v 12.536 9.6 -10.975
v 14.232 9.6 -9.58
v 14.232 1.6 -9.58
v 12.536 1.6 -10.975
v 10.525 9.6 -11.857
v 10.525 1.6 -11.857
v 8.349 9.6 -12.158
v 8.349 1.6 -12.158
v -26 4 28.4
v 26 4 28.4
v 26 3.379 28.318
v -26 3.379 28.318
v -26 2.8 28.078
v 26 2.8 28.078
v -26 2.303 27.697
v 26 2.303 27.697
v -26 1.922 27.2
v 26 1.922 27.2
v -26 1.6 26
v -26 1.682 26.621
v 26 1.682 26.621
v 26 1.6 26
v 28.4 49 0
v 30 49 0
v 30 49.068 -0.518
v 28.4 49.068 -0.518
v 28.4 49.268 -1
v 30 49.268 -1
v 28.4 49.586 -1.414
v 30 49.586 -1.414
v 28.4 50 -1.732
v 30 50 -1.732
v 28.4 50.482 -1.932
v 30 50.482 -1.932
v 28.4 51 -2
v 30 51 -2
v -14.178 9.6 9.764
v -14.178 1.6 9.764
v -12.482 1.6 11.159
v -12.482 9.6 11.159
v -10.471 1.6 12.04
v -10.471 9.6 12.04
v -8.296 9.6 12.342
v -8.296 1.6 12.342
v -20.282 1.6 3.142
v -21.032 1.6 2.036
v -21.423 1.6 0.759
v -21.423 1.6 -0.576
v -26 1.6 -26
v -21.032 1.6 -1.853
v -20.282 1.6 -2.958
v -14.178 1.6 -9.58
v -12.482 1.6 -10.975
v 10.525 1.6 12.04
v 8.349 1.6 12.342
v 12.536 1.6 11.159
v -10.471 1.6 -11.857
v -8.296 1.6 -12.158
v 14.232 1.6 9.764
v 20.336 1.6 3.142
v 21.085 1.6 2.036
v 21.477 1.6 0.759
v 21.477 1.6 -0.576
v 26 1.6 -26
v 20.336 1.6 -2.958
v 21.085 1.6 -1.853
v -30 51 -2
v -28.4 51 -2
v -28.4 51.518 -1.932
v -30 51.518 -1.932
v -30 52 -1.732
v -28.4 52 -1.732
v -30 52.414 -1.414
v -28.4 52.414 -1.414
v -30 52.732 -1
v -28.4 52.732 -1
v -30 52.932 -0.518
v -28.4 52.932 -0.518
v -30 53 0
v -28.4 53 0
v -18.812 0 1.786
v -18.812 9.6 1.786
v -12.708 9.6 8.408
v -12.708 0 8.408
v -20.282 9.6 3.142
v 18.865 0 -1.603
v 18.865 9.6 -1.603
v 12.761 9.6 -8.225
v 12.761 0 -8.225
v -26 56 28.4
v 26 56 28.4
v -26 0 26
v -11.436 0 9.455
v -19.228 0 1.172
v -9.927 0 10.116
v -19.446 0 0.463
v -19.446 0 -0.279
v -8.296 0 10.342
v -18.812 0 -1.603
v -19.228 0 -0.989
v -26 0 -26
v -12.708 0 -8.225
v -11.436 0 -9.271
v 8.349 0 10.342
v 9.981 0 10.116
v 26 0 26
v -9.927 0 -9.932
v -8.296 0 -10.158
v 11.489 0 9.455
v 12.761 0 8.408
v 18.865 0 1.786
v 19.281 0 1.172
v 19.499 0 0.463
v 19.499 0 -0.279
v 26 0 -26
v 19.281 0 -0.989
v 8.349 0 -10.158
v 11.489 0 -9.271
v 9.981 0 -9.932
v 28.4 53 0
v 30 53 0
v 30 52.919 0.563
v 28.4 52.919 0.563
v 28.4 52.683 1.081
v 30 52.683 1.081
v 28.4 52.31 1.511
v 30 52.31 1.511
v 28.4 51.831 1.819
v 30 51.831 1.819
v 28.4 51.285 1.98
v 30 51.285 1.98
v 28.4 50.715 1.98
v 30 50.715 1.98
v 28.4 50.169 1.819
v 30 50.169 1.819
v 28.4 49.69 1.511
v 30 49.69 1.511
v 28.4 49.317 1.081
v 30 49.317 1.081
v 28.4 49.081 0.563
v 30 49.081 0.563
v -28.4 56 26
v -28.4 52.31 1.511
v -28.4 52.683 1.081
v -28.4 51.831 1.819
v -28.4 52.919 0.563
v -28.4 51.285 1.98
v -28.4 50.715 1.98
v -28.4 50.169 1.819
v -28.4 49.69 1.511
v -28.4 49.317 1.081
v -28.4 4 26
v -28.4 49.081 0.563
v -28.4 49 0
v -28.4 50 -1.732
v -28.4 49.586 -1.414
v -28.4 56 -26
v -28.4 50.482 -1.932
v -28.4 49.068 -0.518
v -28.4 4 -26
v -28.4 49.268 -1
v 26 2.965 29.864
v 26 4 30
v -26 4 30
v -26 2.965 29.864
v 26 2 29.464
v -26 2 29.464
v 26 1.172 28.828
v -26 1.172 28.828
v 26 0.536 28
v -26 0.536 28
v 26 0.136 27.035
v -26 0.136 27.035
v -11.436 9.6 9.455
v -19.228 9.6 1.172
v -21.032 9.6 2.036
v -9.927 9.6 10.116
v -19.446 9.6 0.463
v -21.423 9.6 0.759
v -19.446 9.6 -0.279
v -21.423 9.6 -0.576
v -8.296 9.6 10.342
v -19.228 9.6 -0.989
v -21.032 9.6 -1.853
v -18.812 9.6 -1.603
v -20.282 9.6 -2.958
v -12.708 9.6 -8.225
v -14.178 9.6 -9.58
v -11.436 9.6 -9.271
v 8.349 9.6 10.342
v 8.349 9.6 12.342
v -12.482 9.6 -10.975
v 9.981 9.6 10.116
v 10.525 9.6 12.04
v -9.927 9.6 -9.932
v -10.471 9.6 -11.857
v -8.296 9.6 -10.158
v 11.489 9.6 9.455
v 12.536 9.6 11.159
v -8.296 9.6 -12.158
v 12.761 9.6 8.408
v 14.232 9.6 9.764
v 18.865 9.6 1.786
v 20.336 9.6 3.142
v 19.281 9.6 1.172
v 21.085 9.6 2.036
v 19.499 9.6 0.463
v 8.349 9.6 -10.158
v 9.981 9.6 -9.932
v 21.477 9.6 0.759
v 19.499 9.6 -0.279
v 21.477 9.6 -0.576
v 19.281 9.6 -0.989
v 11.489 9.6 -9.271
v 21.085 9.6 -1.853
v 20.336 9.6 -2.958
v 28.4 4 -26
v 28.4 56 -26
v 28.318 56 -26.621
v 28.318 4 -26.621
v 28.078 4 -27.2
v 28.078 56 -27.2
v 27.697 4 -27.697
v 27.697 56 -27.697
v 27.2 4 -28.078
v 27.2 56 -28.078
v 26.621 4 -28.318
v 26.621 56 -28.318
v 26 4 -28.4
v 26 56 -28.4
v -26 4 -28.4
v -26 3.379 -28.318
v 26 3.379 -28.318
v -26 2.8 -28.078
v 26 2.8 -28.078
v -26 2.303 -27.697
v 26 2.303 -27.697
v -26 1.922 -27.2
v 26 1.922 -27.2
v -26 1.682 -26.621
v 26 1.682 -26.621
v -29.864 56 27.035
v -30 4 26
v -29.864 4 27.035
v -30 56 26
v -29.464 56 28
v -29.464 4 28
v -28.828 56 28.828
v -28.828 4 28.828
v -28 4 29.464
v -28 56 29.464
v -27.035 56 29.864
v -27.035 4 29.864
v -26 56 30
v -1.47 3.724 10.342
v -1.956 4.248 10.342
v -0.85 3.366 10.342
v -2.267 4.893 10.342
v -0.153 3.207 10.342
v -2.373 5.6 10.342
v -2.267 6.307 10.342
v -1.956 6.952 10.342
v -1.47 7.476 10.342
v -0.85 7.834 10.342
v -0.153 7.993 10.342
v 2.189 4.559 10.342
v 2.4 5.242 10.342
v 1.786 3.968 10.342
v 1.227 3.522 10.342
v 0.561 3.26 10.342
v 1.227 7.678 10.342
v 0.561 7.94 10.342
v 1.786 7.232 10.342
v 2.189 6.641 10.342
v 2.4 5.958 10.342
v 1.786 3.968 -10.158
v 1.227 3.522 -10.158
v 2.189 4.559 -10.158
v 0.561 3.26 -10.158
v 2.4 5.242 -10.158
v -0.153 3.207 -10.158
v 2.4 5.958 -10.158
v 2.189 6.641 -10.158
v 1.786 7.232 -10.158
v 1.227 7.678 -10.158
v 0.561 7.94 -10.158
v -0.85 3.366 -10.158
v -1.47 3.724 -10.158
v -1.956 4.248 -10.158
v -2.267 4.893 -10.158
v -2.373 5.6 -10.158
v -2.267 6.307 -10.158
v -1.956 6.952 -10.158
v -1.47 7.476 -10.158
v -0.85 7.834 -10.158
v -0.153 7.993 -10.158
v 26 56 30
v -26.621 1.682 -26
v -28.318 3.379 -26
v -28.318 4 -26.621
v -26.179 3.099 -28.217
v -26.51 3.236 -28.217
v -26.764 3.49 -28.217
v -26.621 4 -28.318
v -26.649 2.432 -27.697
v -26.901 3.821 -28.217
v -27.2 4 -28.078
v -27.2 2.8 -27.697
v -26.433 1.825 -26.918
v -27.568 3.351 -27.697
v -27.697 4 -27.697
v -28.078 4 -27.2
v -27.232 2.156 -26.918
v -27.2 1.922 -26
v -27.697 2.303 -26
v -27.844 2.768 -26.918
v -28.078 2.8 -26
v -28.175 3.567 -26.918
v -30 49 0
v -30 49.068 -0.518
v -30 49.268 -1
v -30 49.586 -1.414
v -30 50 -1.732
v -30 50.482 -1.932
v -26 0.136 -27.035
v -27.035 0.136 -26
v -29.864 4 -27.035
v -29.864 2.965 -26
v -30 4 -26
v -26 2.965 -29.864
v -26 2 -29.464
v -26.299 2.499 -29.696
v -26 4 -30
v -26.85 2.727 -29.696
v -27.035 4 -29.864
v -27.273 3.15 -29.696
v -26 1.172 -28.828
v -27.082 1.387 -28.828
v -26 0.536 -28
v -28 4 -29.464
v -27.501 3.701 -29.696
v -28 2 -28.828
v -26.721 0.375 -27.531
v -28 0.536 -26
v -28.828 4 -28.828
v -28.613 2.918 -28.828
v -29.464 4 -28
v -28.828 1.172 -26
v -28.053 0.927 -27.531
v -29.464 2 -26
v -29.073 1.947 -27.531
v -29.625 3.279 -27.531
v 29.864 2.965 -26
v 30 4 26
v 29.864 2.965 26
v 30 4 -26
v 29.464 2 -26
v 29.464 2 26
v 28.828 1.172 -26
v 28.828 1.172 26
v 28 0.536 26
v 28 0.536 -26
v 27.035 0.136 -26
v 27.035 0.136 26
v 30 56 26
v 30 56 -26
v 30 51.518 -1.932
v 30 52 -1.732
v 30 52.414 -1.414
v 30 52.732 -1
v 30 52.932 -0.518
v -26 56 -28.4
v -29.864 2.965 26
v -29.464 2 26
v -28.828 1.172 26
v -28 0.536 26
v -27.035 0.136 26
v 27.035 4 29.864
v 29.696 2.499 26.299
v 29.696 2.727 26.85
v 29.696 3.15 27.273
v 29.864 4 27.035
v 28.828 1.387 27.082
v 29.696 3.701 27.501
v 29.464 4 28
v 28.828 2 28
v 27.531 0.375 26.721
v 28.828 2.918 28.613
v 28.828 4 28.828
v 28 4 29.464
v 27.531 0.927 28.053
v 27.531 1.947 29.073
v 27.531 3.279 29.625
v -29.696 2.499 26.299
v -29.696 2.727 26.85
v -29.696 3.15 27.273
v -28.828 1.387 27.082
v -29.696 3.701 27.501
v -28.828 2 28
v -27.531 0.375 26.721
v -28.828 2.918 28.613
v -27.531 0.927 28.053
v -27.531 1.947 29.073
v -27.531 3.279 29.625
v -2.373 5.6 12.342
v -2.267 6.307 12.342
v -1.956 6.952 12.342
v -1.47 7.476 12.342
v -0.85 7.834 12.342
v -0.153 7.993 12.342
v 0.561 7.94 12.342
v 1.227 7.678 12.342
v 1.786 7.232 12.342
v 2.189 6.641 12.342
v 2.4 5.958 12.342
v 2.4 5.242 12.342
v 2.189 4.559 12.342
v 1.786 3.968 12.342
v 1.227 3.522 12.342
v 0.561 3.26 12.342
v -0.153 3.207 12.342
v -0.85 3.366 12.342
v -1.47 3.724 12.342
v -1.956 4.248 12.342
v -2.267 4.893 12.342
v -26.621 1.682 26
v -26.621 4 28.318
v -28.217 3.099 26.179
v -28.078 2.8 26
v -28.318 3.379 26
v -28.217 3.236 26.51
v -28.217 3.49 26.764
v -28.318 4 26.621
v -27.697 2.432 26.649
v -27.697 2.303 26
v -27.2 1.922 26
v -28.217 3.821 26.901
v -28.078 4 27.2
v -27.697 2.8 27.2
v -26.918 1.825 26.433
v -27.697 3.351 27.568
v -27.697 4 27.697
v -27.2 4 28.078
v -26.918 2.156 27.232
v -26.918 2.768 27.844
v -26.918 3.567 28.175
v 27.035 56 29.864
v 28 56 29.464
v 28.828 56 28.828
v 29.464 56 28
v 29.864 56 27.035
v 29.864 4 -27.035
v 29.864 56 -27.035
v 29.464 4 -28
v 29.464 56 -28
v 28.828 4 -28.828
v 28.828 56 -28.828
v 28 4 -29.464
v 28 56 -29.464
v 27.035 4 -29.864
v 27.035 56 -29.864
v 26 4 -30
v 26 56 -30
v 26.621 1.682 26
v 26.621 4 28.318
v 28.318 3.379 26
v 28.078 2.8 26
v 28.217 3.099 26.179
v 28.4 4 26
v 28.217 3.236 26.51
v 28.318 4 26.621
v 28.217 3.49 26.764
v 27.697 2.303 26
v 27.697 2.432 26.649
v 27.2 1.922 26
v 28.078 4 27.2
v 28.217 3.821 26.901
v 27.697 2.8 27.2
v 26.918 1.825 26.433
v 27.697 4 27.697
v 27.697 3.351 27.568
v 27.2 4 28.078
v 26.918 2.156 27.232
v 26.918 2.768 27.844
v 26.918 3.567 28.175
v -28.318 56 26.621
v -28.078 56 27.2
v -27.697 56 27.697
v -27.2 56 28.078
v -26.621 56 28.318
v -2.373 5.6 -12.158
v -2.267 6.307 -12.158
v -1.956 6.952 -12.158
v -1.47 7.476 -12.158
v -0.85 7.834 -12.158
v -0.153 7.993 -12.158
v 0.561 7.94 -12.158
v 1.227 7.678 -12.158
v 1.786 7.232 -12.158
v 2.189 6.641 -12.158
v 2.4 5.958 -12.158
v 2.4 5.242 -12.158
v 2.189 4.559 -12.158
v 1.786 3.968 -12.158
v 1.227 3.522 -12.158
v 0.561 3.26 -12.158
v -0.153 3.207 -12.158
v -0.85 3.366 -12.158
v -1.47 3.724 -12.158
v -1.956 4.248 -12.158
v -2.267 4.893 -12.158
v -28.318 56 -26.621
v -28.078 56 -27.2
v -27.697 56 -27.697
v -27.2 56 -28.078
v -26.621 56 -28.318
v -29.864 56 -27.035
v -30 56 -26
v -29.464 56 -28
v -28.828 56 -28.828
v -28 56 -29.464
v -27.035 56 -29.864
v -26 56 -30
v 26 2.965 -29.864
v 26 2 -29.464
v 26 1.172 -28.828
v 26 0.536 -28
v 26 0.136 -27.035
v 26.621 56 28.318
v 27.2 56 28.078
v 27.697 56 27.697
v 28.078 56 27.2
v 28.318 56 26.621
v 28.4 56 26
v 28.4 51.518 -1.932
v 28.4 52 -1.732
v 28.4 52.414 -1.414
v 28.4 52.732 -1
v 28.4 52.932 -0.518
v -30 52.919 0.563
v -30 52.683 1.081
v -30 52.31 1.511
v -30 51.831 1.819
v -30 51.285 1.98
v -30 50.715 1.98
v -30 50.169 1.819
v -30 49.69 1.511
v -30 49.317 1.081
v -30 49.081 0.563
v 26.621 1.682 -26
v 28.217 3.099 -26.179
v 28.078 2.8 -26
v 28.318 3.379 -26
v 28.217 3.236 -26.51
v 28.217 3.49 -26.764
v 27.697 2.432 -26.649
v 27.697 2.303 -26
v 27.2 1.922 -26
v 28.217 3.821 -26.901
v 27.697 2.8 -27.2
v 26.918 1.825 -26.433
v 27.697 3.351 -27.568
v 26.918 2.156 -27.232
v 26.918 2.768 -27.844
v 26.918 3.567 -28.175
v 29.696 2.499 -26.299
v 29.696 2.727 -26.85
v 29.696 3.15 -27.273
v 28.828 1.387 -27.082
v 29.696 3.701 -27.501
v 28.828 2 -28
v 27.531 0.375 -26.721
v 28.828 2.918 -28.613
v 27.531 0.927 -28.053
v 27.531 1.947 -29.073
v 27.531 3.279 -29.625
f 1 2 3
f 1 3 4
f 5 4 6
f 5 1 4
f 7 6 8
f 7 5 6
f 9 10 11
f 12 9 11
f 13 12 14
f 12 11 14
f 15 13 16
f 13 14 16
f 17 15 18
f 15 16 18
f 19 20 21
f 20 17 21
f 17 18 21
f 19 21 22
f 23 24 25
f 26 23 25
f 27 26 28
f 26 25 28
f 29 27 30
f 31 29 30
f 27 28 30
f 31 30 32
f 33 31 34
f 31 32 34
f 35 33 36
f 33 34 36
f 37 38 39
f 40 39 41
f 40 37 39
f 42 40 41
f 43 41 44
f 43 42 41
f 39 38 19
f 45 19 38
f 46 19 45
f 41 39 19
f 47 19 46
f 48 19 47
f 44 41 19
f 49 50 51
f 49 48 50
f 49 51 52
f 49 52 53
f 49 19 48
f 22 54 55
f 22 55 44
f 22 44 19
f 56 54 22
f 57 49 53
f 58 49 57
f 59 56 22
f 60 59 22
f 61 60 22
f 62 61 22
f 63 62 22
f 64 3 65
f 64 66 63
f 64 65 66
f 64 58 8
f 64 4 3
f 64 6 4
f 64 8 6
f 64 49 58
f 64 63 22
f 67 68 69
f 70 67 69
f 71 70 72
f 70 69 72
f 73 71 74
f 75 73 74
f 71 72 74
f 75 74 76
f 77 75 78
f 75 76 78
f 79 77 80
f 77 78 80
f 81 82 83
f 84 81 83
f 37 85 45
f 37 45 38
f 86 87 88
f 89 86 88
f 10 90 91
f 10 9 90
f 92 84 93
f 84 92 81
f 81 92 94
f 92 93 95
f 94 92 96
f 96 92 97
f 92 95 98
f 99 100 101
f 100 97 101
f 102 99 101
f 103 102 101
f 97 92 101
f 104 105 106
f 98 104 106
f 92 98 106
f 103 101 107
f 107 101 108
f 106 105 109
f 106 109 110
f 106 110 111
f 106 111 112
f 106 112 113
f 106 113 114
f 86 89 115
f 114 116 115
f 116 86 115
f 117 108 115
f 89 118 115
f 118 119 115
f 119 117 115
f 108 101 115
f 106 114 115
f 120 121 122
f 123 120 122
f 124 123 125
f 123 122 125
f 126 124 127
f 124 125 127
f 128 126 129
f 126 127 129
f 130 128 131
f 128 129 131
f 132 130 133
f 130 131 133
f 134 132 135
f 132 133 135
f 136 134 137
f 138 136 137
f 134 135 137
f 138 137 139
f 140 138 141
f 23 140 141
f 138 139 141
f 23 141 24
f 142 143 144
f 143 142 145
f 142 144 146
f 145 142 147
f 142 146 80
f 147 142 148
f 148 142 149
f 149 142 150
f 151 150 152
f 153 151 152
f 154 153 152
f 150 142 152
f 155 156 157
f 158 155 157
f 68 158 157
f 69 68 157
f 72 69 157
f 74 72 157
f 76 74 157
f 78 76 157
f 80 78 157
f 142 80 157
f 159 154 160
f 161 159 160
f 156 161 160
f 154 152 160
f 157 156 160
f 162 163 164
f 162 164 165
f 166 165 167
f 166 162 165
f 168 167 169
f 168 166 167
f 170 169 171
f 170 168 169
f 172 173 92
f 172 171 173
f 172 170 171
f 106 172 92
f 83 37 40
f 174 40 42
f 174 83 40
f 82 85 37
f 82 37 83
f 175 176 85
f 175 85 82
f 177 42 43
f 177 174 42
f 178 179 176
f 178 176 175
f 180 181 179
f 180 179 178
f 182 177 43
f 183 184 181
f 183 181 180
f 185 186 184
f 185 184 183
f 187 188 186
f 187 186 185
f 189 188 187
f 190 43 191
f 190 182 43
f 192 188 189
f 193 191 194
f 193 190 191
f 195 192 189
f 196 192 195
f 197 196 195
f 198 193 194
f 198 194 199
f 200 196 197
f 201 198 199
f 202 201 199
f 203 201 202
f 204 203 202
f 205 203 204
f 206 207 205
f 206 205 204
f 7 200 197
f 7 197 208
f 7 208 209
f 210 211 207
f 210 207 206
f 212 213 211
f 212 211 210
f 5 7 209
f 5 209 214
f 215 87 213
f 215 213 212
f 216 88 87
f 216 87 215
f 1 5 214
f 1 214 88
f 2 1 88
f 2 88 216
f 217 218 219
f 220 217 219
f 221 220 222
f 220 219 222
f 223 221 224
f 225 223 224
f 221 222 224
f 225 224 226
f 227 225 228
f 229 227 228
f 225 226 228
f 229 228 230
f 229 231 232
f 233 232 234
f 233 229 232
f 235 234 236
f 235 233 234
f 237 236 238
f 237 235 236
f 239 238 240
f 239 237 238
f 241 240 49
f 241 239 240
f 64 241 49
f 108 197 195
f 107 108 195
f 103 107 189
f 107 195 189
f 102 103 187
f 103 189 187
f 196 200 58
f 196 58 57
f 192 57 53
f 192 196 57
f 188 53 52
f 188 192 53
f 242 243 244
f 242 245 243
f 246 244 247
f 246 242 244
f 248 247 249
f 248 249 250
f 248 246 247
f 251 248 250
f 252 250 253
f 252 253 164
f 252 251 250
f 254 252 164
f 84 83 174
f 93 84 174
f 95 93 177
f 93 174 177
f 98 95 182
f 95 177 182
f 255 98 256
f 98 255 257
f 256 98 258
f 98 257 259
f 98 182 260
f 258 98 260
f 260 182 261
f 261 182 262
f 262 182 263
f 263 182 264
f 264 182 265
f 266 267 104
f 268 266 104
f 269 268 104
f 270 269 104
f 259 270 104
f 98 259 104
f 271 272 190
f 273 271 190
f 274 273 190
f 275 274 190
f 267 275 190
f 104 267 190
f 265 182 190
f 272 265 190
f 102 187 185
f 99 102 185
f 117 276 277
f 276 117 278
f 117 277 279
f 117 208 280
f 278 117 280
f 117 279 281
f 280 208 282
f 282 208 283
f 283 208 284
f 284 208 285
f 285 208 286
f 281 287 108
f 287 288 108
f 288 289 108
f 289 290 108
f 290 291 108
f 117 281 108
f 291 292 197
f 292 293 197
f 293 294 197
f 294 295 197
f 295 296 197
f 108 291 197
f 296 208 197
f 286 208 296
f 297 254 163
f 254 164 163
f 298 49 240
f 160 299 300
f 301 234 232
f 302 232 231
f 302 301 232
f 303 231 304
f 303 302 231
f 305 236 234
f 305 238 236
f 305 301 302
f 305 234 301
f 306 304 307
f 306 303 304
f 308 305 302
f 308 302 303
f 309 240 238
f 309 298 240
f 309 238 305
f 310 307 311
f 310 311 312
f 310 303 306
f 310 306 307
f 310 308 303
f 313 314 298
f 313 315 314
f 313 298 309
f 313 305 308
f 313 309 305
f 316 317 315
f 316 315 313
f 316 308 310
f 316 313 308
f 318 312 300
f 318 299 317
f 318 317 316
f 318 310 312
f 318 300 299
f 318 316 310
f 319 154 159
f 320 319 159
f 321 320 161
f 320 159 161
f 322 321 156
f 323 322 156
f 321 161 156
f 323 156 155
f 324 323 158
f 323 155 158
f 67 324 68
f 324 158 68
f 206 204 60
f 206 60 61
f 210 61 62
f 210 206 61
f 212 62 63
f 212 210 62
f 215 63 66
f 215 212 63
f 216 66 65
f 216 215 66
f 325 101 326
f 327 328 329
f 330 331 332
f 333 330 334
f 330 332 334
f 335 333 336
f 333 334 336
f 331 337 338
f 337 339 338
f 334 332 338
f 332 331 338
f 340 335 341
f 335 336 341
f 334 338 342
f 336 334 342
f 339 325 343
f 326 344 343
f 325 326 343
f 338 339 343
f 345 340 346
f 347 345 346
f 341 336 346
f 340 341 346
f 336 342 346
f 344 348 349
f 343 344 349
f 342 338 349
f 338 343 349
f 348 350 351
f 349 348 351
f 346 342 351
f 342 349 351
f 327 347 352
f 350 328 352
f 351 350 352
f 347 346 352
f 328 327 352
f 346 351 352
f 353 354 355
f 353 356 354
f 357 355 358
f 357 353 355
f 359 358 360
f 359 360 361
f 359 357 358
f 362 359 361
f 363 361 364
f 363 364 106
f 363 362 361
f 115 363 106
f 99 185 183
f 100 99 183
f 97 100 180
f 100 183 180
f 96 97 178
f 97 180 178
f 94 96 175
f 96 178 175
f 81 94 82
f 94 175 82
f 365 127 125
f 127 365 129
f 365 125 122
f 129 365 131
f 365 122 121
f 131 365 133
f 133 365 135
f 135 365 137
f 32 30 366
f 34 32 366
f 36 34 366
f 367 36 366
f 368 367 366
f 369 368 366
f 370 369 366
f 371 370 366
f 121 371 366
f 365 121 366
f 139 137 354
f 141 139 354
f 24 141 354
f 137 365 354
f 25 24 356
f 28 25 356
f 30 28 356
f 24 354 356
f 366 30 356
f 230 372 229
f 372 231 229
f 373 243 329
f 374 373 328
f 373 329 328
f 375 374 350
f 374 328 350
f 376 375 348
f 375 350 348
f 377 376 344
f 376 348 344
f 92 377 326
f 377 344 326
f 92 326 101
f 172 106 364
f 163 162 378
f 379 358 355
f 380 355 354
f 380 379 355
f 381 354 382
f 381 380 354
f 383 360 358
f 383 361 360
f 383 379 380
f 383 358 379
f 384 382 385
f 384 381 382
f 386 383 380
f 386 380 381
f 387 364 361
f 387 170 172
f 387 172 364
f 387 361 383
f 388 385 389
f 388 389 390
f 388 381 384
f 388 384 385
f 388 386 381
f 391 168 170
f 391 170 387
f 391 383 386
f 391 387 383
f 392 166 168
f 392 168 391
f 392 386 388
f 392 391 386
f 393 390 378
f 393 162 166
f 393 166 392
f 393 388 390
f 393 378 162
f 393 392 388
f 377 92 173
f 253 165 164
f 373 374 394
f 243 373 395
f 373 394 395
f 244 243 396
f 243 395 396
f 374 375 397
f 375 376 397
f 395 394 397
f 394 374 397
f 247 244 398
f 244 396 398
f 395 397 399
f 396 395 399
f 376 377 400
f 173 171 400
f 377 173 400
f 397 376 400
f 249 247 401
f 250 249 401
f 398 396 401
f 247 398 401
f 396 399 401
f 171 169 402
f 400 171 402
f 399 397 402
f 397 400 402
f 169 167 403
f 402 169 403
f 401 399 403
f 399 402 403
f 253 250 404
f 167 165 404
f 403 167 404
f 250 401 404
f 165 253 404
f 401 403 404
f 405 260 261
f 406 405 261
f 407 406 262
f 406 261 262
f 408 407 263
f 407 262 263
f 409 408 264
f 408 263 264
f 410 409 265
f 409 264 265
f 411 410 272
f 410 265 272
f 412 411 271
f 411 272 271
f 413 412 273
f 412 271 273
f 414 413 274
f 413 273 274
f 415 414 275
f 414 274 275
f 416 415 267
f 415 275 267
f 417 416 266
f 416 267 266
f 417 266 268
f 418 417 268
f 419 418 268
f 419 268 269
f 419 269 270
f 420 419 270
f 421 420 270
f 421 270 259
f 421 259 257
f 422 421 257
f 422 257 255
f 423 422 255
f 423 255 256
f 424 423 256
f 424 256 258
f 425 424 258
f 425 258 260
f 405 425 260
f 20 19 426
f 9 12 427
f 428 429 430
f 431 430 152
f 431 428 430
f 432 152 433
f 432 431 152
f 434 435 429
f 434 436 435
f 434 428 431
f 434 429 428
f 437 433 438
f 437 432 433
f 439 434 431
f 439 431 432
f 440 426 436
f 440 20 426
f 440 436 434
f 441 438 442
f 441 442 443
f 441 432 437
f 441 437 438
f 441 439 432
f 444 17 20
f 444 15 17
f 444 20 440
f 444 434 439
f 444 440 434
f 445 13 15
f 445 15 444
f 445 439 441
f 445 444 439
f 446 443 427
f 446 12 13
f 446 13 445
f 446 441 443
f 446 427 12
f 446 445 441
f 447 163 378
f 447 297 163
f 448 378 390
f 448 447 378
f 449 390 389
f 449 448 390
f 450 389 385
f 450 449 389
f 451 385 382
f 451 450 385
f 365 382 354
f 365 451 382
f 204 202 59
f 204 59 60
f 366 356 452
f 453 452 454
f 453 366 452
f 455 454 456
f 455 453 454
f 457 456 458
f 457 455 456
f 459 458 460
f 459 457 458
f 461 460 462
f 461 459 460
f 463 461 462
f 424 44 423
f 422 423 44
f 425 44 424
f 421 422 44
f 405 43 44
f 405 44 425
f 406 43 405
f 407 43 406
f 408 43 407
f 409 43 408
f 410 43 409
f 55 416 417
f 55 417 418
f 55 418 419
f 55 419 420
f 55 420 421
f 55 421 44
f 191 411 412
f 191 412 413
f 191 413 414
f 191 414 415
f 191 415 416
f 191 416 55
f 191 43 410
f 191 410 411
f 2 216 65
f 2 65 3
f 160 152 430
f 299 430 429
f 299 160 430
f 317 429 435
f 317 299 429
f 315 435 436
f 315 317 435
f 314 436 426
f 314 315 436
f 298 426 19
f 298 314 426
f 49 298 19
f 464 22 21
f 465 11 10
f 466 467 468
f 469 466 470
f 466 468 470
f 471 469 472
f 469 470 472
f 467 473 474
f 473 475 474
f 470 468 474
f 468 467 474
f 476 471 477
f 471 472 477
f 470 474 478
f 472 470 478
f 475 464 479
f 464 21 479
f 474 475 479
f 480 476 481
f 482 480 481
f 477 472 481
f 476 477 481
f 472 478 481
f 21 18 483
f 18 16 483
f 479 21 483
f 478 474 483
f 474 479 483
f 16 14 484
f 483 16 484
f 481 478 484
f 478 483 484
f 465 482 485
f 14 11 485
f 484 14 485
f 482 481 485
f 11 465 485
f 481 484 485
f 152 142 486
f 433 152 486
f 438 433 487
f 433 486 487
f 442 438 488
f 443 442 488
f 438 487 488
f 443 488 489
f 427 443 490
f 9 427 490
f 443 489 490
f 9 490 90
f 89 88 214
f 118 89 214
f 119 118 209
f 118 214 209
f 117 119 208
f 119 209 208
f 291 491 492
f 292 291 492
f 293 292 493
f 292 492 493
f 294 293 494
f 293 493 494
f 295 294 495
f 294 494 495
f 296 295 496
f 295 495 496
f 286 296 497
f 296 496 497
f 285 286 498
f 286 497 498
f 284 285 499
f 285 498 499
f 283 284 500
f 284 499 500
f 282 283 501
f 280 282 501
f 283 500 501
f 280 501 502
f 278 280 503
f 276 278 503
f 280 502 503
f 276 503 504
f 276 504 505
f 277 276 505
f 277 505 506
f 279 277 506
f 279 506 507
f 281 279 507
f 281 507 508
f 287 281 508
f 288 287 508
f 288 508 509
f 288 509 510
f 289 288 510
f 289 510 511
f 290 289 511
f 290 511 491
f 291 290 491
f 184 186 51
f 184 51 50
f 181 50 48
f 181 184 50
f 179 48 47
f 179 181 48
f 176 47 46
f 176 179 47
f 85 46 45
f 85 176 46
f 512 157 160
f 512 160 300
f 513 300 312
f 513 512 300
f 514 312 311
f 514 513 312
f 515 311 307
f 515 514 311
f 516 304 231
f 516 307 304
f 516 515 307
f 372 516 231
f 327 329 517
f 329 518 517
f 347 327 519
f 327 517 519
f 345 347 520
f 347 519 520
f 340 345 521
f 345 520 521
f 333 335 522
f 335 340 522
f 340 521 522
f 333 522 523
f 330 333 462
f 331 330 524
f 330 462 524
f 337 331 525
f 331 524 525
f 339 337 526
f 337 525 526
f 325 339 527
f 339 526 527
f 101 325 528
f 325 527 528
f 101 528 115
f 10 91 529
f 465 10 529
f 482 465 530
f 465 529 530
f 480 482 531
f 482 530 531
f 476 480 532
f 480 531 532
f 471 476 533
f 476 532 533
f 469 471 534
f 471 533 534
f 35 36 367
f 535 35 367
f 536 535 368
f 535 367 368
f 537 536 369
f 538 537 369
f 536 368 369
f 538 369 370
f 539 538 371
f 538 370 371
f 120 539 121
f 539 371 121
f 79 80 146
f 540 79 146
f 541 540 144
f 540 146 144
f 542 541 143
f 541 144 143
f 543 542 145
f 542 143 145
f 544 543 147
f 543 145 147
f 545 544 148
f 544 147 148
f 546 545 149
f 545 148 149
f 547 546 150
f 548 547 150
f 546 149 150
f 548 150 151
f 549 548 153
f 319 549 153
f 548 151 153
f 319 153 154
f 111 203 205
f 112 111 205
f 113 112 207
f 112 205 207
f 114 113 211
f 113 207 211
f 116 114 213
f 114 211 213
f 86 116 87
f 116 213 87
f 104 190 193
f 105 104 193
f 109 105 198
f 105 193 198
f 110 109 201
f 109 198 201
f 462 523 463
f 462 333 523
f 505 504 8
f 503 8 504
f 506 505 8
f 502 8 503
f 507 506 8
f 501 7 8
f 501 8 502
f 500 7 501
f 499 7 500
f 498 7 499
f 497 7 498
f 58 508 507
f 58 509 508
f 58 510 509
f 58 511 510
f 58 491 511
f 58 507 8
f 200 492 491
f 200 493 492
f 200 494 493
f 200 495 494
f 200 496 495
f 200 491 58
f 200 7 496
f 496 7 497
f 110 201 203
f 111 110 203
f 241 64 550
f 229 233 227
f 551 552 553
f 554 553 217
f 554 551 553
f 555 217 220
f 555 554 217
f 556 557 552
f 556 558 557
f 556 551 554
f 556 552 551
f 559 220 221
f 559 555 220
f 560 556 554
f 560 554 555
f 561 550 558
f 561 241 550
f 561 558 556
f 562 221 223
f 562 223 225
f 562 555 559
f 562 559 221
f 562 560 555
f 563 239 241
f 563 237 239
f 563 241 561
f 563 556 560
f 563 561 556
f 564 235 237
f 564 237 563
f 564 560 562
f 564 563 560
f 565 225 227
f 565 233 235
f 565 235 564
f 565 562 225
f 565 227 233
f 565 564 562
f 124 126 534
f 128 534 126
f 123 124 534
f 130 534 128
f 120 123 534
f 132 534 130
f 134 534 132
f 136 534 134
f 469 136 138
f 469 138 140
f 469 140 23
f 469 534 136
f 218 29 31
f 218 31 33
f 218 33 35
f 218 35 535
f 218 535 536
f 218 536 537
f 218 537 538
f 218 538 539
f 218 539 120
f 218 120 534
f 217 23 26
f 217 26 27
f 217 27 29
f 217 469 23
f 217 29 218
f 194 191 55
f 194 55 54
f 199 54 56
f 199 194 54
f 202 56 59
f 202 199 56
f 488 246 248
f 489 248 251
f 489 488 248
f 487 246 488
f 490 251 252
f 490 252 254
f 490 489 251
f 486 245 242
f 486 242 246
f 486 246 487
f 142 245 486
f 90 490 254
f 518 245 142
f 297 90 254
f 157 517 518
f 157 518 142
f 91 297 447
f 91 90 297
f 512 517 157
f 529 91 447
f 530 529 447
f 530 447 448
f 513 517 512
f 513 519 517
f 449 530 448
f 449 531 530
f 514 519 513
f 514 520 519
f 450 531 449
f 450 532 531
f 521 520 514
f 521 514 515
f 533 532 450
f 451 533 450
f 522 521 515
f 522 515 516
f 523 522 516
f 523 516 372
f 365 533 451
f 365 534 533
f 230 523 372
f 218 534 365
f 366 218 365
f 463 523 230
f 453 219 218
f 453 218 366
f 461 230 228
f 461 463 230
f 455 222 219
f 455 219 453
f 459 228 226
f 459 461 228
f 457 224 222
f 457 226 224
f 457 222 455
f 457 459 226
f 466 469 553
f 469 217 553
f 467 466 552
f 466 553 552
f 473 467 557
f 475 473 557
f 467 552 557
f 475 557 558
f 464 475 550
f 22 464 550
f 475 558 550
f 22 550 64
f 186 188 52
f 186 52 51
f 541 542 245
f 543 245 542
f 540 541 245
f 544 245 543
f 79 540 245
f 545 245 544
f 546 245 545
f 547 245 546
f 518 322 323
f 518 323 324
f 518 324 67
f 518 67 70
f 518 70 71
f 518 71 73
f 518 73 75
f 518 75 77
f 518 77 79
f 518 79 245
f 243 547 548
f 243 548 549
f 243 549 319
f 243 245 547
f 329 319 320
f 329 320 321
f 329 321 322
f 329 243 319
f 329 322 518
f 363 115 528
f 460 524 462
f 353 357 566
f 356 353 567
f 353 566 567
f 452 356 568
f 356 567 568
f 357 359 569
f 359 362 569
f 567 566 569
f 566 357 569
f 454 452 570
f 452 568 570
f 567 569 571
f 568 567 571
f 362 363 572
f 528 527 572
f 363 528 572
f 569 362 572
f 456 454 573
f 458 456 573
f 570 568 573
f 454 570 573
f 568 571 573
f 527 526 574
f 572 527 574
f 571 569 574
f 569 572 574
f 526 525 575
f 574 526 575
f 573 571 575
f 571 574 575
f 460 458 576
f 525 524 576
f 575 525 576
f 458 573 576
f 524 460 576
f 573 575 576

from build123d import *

# Parameters (mm, degrees)
SKETCH1_W           = 60
SKETCH1_H           = 60
BOSS_EXTRUDE1_DEPTH = 56
FILLET1_R           = 4
SHELL1_T            = -1.6
CUT_EXTRUDE1_DEPTH  = 69.988114918
BOSS_EXTRUDE2_START = 8
BOSS_EXTRUDE2_DEPTH = 8
CUT_EXTRUDE2_REACH  = 78.245
SKETCH3_R           = 2.4
CUT_EXTRUDE3_REACH  = 89.384


with BuildPart() as part:
    # Sketch1 → Boss-Extrude1 (new body)
    with BuildSketch(Plane(origin=(0, 0, 0), x_dir=(1, 0, 0), z_dir=(0, 1, 0))):
        Rectangle(SKETCH1_W, SKETCH1_H)
    extrude(amount=BOSS_EXTRUDE1_DEPTH)

    # Fillet1
    fillet1_edges = [part.edges().sort_by_distance(p)[0] for p in [
        (0, 0, 30),
        (-30, 0, 0),
        (0, 0, -30),
        (30, 0, 0),
        (30, 28, 30),
        (-30, 28, 30),
        (-30, 28, -30),
        (30, 28, -30),
    ]]
    fillet(fillet1_edges, radius=FILLET1_R)

    # Shell1
    shell1_openings = [part.faces().sort_by_distance(p)[0] for p in [
        (0, 56, 0),
    ]]
    offset(amount=SHELL1_T, openings=shell1_openings, kind=Kind.INTERSECTION)

    # Sketch2 → Cut-Extrude1 (cut, through all)
    with BuildSketch(Plane(origin=(0, 1.6, 0), x_dir=(1, 0, 0), z_dir=(0, 1, 0))):
        with BuildLine():
            Line((18.864939852, 1.60266636), (12.761084932, 8.2247849))
            ThreePointArc((12.761084932, 8.2247849), (10.757749844, 9.653700125), (8.349320226, 10.158295975))
            Line((8.349320226, 10.158295975), (-8.295911111, 10.158295975))
            ThreePointArc((-8.295911111, 10.158295975), (-10.704340729, 9.653700125), (-12.707675817, 8.2247849))
            Line((-12.707675817, 8.2247849), (-18.811530736, 1.60266636))
            ThreePointArc((-18.811530736, 1.60266636), (-19.473295442, -0.091704025), (-18.811530736, -1.786074411))
            Line((-18.811530736, -1.786074411), (-12.707675817, -8.408192951))
            ThreePointArc((-12.707675817, -8.408192951), (-10.704340729, -9.837108176), (-8.295911111, -10.341704025))
            Line((-8.295911111, -10.341704025), (8.349320226, -10.341704025))
            ThreePointArc((8.349320226, -10.341704025), (10.757749844, -9.837108176), (12.761084932, -8.408192951))
            Line((12.761084932, -8.408192951), (18.864939852, -1.786074411))
            ThreePointArc((18.864939852, -1.786074411), (19.526704558, -0.091704025), (18.864939852, 1.60266636))
        make_face()
    extrude(amount=-CUT_EXTRUDE1_DEPTH, mode=Mode.SUBTRACT)

    # Sketch2<4> → Boss-Extrude2 (add)
    with BuildSketch(Plane(origin=(0, 1.6, 0), x_dir=(1, 0, 0), z_dir=(0, 1, 0)).offset(BOSS_EXTRUDE2_START)):
        with BuildLine():
            Line((20.335528087, 2.958162669), (14.231673168, 9.580281209))
            ThreePointArc((14.231673168, 9.580281209), (11.560559717, 11.485501509), (8.349320226, 12.158295975))
            Line((8.349320226, 12.158295975), (-8.295911111, 12.158295975))
            ThreePointArc((-8.295911111, 12.158295975), (-11.507150601, 11.485501509), (-14.178264052, 9.580281209))
            Line((-14.178264052, 9.580281209), (-20.282118972, 2.958162669))
            ThreePointArc((-20.282118972, 2.958162669), (-21.473295442, -0.091704025), (-20.282118972, -3.141570719))
            Line((-20.282118972, -3.141570719), (-14.178264052, -9.763689259))
            ThreePointArc((-14.178264052, -9.763689259), (-11.507150601, -11.668909559), (-8.295911111, -12.341704025))
            Line((-8.295911111, -12.341704025), (8.349320226, -12.341704025))
            ThreePointArc((8.349320226, -12.341704025), (11.560559717, -11.668909559), (14.231673168, -9.763689259))
            Line((14.231673168, -9.763689259), (20.335528087, -3.141570719))
            ThreePointArc((20.335528087, -3.141570719), (21.526704558, -0.091704025), (20.335528087, 2.958162669))
        make_face()
        with BuildLine():
            Line((18.864939852, 1.60266636), (12.761084932, 8.2247849))
            ThreePointArc((12.761084932, 8.2247849), (10.757749844, 9.653700125), (8.349320226, 10.158295975))
            Line((8.349320226, 10.158295975), (-8.295911111, 10.158295975))
            ThreePointArc((-8.295911111, 10.158295975), (-10.704340729, 9.653700125), (-12.707675817, 8.2247849))
            Line((-12.707675817, 8.2247849), (-18.811530736, 1.60266636))
            ThreePointArc((-18.811530736, 1.60266636), (-19.473295442, -0.091704025), (-18.811530736, -1.786074411))
            Line((-18.811530736, -1.786074411), (-12.707675817, -8.408192951))
            ThreePointArc((-12.707675817, -8.408192951), (-10.704340729, -9.837108176), (-8.295911111, -10.341704025))
            Line((-8.295911111, -10.341704025), (8.349320226, -10.341704025))
            ThreePointArc((8.349320226, -10.341704025), (10.757749844, -9.837108176), (12.761084932, -8.408192951))
            Line((12.761084932, -8.408192951), (18.864939852, -1.786074411))
            ThreePointArc((18.864939852, -1.786074411), (19.526704558, -0.091704025), (18.864939852, 1.60266636))
        make_face(mode=Mode.SUBTRACT)
    extrude(amount=-BOSS_EXTRUDE2_DEPTH)

    # Cut-Extrude2: up to this face of the body (flat: up to its plane)
    cut_extrude2_end = Plane(part.part.faces().sort_by_distance((0.026704558, 5.6, 12.341704025))[0])
    # Sketch3 → Cut-Extrude2 (cut, up to the picked face)
    with BuildSketch(Plane(origin=(0, 0, -12.158295975), x_dir=(-1, 0, 0), z_dir=(0, 0, -1)), mode=Mode.PRIVATE) as cut_extrude2_sk1:
        with Locations((-0.026704558, 5.6)):
            Circle(SKETCH3_R)
    cut_extrude2_tool1 = split(extrude(cut_extrude2_sk1.sketch, amount=-CUT_EXTRUDE2_REACH, mode=Mode.PRIVATE), bisect_by=cut_extrude2_end, keep=Keep.BOTH, mode=Mode.PRIVATE)
    add(cut_extrude2_tool1.solids().sort_by(Axis((0.026705, 5.6, -12.158296), (0, 0, 1)))[0], mode=Mode.SUBTRACT)

    # Cut-Extrude3: up to this face of the body (flat: up to its plane)
    cut_extrude3_end = Plane(part.part.faces().sort_by_distance((-30, 30, 0))[0])
    # Sketch4 → Cut-Extrude3 (cut, up to the picked face)
    with BuildSketch(Plane(origin=(30, 0, 0), x_dir=(0, 0, -1), z_dir=(1, 0, 0)), mode=Mode.PRIVATE) as cut_extrude3_sk1:
        with BuildLine():
            ThreePointArc((2, 51), (1.414213562, 52.414213562), (0, 53))
            Line((0, 53), (0, 49))
            ThreePointArc((0, 49), (1.414213562, 49.585786438), (2, 51))
        make_face()
    cut_extrude3_tool1 = split(extrude(cut_extrude3_sk1.sketch, amount=-CUT_EXTRUDE3_REACH, mode=Mode.PRIVATE), bisect_by=cut_extrude3_end, keep=Keep.BOTH, mode=Mode.PRIVATE)
    # Sketch4 → Cut-Extrude3 (cut, up to the picked face)
    with BuildSketch(Plane(origin=(30, 0, 0), x_dir=(0, 0, -1), z_dir=(1, 0, 0)), mode=Mode.PRIVATE) as cut_extrude3_sk2:
        with BuildLine():
            Line((0, 49), (0, 53))
            ThreePointArc((0, 53), (-2, 51), (0, 49))
        make_face()
    cut_extrude3_tool2 = split(extrude(cut_extrude3_sk2.sketch, amount=-CUT_EXTRUDE3_REACH, mode=Mode.PRIVATE), bisect_by=cut_extrude3_end, keep=Keep.BOTH, mode=Mode.PRIVATE)
    # Sketch4 → Cut-Extrude3 (cut, up to the picked face)
    with BuildSketch(Plane(origin=(30, 0, 0), x_dir=(0, 0, -1), z_dir=(1, 0, 0)), mode=Mode.PRIVATE) as cut_extrude3_sk3:
        with BuildLine():
            ThreePointArc((2, 51), (1.414213562, 52.414213562), (0, 53))
            Line((0, 53), (0, 49))
            ThreePointArc((0, 49), (1.414213562, 49.585786438), (2, 51))
        make_face()
    cut_extrude3_tool3 = split(extrude(cut_extrude3_sk3.sketch, amount=-CUT_EXTRUDE3_REACH, mode=Mode.PRIVATE), bisect_by=cut_extrude3_end, keep=Keep.BOTH, mode=Mode.PRIVATE)
    # Sketch4 → Cut-Extrude3 (cut, up to the picked face)
    with BuildSketch(Plane(origin=(30, 0, 0), x_dir=(0, 0, -1), z_dir=(1, 0, 0)), mode=Mode.PRIVATE) as cut_extrude3_sk4:
        with BuildLine():
            Line((0, 49), (0, 53))
            ThreePointArc((0, 53), (-2, 51), (0, 49))
        make_face()
    cut_extrude3_tool4 = split(extrude(cut_extrude3_sk4.sketch, amount=-CUT_EXTRUDE3_REACH, mode=Mode.PRIVATE), bisect_by=cut_extrude3_end, keep=Keep.BOTH, mode=Mode.PRIVATE)
    add(cut_extrude3_tool1.solids().sort_by(Axis((30, 51, -0.848826), (-1, 0, 0)))[0], mode=Mode.SUBTRACT)
    add(cut_extrude3_tool2.solids().sort_by(Axis((30, 51, 0.848826), (-1, 0, 0)))[0], mode=Mode.SUBTRACT)
    add(cut_extrude3_tool3.solids().sort_by(Axis((30, 51, -0.848826), (-1, 0, 0)))[0], mode=Mode.SUBTRACT)
    add(cut_extrude3_tool4.solids().sort_by(Axis((30, 51, 0.848826), (-1, 0, 0)))[0], mode=Mode.SUBTRACT)


solid = part.part
